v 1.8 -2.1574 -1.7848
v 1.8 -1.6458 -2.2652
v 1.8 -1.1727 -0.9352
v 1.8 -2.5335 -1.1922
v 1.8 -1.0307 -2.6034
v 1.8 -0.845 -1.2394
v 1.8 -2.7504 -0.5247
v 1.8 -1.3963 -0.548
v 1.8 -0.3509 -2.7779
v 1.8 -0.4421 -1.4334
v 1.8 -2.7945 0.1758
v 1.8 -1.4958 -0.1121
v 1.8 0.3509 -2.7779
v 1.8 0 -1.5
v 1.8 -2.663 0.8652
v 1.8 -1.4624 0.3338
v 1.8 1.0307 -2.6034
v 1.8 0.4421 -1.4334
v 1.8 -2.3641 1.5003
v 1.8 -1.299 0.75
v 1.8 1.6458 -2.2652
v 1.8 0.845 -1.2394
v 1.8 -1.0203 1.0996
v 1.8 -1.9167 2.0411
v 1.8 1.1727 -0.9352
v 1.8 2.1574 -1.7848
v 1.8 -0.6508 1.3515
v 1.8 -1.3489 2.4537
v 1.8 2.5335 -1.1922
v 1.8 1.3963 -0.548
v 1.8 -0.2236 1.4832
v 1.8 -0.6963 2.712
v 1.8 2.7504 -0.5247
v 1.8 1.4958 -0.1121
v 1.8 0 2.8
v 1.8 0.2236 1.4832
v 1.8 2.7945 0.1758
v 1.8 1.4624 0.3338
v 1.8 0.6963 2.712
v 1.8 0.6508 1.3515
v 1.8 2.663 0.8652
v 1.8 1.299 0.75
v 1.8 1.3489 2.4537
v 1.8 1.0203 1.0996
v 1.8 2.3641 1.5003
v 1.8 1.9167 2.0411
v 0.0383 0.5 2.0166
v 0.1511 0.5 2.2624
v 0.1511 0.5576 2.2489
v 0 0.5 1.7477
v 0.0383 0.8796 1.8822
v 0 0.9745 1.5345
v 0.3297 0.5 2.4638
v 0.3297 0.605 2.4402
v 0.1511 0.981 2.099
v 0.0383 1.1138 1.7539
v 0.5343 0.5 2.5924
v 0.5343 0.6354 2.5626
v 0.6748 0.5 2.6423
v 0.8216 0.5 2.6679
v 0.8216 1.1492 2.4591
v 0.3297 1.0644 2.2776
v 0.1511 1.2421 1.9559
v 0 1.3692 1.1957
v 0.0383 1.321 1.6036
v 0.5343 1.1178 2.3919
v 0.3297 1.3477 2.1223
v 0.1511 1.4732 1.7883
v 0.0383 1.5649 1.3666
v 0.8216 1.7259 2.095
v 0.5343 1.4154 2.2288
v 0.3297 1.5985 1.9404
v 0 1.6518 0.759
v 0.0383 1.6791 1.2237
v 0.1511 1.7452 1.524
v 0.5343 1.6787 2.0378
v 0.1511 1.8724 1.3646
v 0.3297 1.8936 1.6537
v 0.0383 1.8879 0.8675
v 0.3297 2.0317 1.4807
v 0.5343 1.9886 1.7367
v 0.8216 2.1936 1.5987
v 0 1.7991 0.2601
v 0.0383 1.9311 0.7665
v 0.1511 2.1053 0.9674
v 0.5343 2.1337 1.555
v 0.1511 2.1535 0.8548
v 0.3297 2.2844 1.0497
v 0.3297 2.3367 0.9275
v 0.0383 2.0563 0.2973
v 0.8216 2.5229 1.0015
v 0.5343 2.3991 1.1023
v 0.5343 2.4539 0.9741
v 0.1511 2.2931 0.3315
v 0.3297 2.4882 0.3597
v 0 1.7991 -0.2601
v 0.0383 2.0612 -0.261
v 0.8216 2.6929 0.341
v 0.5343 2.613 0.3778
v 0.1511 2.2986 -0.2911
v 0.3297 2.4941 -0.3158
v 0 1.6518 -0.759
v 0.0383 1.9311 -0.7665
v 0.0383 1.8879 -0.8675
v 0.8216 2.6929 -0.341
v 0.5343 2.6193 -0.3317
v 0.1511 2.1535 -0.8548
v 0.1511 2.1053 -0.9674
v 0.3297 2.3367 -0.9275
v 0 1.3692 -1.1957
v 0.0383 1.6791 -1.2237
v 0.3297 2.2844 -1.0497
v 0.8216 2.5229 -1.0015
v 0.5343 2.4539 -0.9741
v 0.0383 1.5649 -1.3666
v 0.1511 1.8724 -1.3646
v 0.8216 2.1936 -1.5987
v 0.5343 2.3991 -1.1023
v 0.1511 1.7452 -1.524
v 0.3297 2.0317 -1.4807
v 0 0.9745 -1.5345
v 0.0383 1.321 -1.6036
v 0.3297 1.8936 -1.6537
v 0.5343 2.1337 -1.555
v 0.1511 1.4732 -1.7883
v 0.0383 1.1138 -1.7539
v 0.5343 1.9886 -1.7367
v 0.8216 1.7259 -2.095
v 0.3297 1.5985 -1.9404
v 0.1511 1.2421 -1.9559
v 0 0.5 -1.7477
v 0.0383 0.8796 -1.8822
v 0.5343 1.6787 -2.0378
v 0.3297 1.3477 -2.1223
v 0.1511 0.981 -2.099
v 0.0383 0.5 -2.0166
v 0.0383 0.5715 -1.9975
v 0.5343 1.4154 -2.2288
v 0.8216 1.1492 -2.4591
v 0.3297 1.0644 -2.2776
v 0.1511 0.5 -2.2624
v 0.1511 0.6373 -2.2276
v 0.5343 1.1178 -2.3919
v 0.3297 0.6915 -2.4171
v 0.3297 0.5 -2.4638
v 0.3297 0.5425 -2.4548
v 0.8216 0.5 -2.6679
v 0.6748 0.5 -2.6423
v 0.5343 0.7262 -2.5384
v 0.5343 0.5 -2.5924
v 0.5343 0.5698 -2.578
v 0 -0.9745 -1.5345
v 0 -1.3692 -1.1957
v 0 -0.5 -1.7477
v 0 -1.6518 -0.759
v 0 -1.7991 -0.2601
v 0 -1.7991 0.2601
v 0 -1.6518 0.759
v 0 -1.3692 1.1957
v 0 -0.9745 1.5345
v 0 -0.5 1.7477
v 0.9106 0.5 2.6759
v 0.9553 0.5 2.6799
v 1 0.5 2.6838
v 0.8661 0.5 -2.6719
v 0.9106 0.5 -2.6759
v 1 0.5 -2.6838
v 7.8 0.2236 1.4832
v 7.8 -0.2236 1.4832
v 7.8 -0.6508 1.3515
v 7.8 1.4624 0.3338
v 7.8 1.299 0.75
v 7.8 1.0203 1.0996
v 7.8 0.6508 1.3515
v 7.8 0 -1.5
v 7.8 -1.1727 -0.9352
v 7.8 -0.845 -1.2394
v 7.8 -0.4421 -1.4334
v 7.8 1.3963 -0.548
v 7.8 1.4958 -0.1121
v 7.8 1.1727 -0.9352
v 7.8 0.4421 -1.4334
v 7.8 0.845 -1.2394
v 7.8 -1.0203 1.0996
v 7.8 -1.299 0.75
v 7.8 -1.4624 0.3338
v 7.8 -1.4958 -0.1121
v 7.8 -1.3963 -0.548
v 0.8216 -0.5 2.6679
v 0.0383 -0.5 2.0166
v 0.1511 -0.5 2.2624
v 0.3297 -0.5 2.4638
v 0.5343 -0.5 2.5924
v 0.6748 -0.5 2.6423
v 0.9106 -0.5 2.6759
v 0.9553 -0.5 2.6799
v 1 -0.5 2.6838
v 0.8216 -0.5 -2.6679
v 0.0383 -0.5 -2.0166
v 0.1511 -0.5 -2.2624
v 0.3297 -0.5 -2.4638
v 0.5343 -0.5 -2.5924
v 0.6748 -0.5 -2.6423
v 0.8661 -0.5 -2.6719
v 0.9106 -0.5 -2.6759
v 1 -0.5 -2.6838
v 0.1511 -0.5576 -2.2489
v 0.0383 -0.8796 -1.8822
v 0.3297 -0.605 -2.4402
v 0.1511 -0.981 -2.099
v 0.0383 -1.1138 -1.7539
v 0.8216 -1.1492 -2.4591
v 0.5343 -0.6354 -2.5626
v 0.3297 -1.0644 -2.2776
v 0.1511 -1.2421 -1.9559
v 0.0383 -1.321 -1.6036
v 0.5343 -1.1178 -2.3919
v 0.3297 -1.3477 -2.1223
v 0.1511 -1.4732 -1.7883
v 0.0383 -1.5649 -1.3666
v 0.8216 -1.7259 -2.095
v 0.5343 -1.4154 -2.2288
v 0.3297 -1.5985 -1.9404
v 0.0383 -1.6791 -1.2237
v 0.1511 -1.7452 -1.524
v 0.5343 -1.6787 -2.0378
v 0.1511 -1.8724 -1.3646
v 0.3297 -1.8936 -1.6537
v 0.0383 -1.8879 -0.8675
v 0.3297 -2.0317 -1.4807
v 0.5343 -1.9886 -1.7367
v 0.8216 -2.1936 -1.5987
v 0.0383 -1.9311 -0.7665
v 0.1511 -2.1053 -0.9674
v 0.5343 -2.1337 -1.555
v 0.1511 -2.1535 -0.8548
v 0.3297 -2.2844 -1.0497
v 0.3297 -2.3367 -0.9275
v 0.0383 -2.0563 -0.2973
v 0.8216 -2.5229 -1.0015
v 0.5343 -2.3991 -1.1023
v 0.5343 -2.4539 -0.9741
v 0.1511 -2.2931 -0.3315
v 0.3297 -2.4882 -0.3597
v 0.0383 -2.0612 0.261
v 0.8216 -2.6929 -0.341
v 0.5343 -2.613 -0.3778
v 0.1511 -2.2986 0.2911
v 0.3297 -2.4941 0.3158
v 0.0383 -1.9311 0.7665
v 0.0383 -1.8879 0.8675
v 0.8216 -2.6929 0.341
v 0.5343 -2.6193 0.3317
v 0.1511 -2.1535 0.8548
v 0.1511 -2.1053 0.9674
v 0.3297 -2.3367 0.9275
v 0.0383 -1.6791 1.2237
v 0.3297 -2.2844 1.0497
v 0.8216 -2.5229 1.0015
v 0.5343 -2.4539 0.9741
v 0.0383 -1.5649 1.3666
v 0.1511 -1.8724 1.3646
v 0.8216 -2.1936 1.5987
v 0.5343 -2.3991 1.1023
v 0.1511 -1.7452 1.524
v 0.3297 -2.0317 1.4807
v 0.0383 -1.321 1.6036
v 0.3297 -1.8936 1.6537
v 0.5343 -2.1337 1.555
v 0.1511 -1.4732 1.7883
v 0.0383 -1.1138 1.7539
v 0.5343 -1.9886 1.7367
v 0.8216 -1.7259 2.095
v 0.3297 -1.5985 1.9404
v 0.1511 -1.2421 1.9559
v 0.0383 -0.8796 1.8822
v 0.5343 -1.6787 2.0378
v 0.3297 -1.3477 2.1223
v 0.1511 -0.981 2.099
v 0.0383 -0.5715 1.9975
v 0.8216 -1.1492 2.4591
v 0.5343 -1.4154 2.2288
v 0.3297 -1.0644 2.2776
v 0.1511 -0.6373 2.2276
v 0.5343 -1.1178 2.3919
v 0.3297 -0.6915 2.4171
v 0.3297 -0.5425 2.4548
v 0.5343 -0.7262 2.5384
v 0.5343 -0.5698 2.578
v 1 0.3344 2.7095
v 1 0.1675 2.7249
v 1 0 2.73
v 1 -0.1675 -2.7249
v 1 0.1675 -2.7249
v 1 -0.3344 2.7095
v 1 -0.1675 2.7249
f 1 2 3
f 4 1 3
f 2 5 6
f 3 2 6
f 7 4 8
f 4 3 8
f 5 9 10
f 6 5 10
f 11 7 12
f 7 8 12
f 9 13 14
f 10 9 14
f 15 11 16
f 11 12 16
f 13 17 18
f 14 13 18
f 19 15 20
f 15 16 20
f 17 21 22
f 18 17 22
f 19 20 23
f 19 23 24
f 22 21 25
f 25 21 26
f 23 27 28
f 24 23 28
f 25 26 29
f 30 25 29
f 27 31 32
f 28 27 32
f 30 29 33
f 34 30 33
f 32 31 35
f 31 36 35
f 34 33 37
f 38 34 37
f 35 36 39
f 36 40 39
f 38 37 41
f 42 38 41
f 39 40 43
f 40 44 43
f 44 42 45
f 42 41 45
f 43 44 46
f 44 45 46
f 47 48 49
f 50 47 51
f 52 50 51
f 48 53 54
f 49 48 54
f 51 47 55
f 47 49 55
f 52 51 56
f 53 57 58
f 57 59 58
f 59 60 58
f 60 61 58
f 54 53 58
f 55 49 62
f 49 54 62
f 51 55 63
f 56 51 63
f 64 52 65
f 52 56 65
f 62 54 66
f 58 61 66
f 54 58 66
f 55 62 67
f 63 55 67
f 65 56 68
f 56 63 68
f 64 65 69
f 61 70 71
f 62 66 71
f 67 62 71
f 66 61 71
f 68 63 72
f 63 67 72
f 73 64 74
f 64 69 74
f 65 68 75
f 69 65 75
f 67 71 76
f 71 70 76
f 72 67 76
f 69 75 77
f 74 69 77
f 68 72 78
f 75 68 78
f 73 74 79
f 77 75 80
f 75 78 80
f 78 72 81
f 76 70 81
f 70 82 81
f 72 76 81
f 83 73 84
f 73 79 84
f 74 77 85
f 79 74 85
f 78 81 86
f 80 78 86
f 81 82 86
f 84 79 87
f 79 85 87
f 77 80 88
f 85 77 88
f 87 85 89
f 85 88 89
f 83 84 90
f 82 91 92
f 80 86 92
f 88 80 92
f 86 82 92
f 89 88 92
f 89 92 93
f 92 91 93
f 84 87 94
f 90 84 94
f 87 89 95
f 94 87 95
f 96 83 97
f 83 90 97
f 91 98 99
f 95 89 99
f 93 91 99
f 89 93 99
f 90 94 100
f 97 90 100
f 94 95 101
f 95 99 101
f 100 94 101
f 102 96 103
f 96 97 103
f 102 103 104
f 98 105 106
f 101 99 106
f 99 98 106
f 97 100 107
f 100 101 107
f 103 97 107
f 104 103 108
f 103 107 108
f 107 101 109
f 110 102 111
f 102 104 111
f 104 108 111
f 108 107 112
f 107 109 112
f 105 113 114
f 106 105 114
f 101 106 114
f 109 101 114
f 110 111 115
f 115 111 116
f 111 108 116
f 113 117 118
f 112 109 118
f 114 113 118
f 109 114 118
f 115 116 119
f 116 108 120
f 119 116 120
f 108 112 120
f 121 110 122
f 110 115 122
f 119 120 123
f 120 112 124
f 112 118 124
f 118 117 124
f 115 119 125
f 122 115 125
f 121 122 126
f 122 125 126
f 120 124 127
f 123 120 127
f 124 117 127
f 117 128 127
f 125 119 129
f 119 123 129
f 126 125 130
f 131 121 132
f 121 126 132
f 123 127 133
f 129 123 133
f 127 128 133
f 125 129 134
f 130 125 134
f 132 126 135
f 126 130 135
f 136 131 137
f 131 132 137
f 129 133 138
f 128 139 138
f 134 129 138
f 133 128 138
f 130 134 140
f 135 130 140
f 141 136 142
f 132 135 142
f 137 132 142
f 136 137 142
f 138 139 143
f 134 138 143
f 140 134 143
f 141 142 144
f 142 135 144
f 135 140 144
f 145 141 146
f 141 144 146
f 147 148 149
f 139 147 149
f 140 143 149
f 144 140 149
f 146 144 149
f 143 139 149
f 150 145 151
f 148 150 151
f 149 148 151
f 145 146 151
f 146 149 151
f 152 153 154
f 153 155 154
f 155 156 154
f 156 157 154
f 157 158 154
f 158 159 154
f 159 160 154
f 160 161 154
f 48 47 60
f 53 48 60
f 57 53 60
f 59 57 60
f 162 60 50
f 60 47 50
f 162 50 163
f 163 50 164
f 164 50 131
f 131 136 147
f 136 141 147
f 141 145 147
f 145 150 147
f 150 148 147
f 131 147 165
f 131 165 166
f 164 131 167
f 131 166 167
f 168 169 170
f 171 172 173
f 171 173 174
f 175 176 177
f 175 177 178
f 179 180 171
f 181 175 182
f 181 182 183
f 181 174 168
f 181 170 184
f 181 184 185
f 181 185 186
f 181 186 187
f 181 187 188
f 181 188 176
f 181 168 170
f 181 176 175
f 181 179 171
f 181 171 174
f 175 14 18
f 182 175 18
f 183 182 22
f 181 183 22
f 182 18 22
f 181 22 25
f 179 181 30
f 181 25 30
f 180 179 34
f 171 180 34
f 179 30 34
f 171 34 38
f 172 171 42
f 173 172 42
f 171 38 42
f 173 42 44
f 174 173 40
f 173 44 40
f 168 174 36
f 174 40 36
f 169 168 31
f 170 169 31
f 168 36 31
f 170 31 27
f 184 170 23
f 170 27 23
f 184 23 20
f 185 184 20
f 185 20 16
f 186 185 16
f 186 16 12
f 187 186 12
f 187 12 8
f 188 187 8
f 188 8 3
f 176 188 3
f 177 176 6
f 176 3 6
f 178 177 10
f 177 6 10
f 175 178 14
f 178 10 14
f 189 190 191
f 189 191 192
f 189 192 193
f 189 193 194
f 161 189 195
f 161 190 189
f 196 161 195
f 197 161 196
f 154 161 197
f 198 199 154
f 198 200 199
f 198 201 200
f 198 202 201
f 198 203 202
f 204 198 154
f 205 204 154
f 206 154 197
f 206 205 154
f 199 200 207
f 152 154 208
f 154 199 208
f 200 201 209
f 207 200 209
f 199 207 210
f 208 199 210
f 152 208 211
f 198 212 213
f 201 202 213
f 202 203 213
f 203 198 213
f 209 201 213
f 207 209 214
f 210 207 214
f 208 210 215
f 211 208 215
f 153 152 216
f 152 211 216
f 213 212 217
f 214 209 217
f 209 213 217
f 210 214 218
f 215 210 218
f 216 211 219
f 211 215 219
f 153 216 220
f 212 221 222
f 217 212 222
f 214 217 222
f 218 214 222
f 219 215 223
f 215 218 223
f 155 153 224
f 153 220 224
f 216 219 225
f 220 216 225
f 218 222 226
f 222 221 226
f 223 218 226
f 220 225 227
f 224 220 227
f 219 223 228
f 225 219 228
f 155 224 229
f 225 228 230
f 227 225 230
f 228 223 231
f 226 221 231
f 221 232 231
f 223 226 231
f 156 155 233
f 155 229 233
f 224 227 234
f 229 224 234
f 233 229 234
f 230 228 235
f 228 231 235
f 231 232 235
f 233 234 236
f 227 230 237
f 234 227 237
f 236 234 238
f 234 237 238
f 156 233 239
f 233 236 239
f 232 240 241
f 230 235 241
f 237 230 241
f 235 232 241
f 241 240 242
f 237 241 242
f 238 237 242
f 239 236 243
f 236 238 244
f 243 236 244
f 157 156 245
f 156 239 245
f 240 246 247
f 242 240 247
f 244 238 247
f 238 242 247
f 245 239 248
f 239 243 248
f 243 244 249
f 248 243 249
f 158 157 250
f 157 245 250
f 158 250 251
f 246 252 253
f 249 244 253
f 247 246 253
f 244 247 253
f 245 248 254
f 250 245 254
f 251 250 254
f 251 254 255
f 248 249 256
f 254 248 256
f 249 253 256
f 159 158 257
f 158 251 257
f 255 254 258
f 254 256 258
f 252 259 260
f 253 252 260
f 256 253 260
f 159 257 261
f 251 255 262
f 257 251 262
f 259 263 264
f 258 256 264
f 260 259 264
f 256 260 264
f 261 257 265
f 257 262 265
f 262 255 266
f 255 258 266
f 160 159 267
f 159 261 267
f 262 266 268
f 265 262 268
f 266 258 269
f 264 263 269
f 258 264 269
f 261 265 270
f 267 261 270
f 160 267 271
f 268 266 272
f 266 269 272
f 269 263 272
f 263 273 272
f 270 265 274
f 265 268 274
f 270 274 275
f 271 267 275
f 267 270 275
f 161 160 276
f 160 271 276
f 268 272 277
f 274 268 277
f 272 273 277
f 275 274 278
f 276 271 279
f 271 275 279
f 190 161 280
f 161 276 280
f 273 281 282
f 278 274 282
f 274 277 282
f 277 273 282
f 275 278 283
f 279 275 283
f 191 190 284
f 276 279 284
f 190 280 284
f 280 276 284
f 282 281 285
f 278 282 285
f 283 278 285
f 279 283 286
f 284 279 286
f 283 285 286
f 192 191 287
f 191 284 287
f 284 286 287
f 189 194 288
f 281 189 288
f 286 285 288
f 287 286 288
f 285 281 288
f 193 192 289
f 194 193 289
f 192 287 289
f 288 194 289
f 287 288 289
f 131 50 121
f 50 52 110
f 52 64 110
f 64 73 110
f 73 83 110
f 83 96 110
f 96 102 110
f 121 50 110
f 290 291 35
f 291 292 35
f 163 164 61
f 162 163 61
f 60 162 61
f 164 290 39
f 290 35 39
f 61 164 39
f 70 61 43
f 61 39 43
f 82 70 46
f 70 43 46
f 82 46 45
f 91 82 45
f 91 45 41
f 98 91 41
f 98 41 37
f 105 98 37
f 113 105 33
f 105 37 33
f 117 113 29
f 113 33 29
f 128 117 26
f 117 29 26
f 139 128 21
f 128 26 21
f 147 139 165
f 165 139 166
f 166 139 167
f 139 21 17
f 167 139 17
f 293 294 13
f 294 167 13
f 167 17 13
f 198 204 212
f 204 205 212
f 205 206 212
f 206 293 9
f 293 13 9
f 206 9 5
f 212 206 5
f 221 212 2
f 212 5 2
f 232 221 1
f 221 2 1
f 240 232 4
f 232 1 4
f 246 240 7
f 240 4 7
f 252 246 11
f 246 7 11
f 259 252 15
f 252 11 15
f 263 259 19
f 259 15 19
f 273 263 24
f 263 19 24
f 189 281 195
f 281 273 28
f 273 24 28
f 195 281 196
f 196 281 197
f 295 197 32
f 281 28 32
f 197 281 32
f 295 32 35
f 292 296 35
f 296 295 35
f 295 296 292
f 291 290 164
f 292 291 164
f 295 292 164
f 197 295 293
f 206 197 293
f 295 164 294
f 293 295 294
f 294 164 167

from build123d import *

# Parameters (mm, degrees)
ESQUISSE2_R             = 1.5
BOSS_EXTRU_1_DEPTH      = 6
ENL_V_MAT_EXTRU_1_DEPTH = 0.5


with BuildPart() as part:
    # Esquisse1 → Révolution1 (revolve)
    with BuildSketch(Plane(origin=(0, 0, 0), x_dir=(-1, 0, 0), z_dir=(0, 0, -1)), mode=Mode.PRIVATE) as r_volution1_sk:
        with BuildLine():
            Line((-1.8, 2.8), (-1.8, 0))
            Line((-1.8, 0), (0, 0))
            Line((0, 0), (0, 1.817822349))
            ThreePointArc((0, 1.817822349), (-0.236450397, 2.425853536), (-0.821559832, 2.714397577))
            Line((-0.821559832, 2.714397577), (-1.8, 2.8))
        make_face()
    revolve(r_volution1_sk.sketch.rotate(Axis((1.8, 0, 0), (-1, 0, 0)), 270), axis=Axis((1.8, 0, 0), (-1, 0, 0)))

    # Esquisse2 → Boss.-Extru.1 (add)
    with BuildSketch(Plane(origin=(1.8, 0, 0), x_dir=(0, 0, -1), z_dir=(1, 0, 0))):
        Circle(ESQUISSE2_R)
    extrude(amount=BOSS_EXTRU_1_DEPTH)

    # Esquisse3 → Enlèv. mat.-Extru.1 (cut, symmetric)
    with BuildSketch(Plane(origin=(0, 0, 0), x_dir=(1, 0, 0), z_dir=(0, 1, 0))):
        with BuildLine():
            Line((0, 1.817822349), (0, -1.817822349))
            ThreePointArc((0, -1.817822349), (0.236450397, -2.425853536), (0.821559832, -2.714397577))
            Line((0.821559832, -2.714397577), (1, -2.730009069))
            Line((1, -2.730009069), (1, 2.730009069))
            Line((1, 2.730009069), (0.821559832, 2.714397577))
            ThreePointArc((0.821559832, 2.714397577), (0.236450397, 2.425853536), (0, 1.817822349))
        make_face()
    extrude(amount=ENL_V_MAT_EXTRU_1_DEPTH, both=True, mode=Mode.SUBTRACT)


solid = part.part
